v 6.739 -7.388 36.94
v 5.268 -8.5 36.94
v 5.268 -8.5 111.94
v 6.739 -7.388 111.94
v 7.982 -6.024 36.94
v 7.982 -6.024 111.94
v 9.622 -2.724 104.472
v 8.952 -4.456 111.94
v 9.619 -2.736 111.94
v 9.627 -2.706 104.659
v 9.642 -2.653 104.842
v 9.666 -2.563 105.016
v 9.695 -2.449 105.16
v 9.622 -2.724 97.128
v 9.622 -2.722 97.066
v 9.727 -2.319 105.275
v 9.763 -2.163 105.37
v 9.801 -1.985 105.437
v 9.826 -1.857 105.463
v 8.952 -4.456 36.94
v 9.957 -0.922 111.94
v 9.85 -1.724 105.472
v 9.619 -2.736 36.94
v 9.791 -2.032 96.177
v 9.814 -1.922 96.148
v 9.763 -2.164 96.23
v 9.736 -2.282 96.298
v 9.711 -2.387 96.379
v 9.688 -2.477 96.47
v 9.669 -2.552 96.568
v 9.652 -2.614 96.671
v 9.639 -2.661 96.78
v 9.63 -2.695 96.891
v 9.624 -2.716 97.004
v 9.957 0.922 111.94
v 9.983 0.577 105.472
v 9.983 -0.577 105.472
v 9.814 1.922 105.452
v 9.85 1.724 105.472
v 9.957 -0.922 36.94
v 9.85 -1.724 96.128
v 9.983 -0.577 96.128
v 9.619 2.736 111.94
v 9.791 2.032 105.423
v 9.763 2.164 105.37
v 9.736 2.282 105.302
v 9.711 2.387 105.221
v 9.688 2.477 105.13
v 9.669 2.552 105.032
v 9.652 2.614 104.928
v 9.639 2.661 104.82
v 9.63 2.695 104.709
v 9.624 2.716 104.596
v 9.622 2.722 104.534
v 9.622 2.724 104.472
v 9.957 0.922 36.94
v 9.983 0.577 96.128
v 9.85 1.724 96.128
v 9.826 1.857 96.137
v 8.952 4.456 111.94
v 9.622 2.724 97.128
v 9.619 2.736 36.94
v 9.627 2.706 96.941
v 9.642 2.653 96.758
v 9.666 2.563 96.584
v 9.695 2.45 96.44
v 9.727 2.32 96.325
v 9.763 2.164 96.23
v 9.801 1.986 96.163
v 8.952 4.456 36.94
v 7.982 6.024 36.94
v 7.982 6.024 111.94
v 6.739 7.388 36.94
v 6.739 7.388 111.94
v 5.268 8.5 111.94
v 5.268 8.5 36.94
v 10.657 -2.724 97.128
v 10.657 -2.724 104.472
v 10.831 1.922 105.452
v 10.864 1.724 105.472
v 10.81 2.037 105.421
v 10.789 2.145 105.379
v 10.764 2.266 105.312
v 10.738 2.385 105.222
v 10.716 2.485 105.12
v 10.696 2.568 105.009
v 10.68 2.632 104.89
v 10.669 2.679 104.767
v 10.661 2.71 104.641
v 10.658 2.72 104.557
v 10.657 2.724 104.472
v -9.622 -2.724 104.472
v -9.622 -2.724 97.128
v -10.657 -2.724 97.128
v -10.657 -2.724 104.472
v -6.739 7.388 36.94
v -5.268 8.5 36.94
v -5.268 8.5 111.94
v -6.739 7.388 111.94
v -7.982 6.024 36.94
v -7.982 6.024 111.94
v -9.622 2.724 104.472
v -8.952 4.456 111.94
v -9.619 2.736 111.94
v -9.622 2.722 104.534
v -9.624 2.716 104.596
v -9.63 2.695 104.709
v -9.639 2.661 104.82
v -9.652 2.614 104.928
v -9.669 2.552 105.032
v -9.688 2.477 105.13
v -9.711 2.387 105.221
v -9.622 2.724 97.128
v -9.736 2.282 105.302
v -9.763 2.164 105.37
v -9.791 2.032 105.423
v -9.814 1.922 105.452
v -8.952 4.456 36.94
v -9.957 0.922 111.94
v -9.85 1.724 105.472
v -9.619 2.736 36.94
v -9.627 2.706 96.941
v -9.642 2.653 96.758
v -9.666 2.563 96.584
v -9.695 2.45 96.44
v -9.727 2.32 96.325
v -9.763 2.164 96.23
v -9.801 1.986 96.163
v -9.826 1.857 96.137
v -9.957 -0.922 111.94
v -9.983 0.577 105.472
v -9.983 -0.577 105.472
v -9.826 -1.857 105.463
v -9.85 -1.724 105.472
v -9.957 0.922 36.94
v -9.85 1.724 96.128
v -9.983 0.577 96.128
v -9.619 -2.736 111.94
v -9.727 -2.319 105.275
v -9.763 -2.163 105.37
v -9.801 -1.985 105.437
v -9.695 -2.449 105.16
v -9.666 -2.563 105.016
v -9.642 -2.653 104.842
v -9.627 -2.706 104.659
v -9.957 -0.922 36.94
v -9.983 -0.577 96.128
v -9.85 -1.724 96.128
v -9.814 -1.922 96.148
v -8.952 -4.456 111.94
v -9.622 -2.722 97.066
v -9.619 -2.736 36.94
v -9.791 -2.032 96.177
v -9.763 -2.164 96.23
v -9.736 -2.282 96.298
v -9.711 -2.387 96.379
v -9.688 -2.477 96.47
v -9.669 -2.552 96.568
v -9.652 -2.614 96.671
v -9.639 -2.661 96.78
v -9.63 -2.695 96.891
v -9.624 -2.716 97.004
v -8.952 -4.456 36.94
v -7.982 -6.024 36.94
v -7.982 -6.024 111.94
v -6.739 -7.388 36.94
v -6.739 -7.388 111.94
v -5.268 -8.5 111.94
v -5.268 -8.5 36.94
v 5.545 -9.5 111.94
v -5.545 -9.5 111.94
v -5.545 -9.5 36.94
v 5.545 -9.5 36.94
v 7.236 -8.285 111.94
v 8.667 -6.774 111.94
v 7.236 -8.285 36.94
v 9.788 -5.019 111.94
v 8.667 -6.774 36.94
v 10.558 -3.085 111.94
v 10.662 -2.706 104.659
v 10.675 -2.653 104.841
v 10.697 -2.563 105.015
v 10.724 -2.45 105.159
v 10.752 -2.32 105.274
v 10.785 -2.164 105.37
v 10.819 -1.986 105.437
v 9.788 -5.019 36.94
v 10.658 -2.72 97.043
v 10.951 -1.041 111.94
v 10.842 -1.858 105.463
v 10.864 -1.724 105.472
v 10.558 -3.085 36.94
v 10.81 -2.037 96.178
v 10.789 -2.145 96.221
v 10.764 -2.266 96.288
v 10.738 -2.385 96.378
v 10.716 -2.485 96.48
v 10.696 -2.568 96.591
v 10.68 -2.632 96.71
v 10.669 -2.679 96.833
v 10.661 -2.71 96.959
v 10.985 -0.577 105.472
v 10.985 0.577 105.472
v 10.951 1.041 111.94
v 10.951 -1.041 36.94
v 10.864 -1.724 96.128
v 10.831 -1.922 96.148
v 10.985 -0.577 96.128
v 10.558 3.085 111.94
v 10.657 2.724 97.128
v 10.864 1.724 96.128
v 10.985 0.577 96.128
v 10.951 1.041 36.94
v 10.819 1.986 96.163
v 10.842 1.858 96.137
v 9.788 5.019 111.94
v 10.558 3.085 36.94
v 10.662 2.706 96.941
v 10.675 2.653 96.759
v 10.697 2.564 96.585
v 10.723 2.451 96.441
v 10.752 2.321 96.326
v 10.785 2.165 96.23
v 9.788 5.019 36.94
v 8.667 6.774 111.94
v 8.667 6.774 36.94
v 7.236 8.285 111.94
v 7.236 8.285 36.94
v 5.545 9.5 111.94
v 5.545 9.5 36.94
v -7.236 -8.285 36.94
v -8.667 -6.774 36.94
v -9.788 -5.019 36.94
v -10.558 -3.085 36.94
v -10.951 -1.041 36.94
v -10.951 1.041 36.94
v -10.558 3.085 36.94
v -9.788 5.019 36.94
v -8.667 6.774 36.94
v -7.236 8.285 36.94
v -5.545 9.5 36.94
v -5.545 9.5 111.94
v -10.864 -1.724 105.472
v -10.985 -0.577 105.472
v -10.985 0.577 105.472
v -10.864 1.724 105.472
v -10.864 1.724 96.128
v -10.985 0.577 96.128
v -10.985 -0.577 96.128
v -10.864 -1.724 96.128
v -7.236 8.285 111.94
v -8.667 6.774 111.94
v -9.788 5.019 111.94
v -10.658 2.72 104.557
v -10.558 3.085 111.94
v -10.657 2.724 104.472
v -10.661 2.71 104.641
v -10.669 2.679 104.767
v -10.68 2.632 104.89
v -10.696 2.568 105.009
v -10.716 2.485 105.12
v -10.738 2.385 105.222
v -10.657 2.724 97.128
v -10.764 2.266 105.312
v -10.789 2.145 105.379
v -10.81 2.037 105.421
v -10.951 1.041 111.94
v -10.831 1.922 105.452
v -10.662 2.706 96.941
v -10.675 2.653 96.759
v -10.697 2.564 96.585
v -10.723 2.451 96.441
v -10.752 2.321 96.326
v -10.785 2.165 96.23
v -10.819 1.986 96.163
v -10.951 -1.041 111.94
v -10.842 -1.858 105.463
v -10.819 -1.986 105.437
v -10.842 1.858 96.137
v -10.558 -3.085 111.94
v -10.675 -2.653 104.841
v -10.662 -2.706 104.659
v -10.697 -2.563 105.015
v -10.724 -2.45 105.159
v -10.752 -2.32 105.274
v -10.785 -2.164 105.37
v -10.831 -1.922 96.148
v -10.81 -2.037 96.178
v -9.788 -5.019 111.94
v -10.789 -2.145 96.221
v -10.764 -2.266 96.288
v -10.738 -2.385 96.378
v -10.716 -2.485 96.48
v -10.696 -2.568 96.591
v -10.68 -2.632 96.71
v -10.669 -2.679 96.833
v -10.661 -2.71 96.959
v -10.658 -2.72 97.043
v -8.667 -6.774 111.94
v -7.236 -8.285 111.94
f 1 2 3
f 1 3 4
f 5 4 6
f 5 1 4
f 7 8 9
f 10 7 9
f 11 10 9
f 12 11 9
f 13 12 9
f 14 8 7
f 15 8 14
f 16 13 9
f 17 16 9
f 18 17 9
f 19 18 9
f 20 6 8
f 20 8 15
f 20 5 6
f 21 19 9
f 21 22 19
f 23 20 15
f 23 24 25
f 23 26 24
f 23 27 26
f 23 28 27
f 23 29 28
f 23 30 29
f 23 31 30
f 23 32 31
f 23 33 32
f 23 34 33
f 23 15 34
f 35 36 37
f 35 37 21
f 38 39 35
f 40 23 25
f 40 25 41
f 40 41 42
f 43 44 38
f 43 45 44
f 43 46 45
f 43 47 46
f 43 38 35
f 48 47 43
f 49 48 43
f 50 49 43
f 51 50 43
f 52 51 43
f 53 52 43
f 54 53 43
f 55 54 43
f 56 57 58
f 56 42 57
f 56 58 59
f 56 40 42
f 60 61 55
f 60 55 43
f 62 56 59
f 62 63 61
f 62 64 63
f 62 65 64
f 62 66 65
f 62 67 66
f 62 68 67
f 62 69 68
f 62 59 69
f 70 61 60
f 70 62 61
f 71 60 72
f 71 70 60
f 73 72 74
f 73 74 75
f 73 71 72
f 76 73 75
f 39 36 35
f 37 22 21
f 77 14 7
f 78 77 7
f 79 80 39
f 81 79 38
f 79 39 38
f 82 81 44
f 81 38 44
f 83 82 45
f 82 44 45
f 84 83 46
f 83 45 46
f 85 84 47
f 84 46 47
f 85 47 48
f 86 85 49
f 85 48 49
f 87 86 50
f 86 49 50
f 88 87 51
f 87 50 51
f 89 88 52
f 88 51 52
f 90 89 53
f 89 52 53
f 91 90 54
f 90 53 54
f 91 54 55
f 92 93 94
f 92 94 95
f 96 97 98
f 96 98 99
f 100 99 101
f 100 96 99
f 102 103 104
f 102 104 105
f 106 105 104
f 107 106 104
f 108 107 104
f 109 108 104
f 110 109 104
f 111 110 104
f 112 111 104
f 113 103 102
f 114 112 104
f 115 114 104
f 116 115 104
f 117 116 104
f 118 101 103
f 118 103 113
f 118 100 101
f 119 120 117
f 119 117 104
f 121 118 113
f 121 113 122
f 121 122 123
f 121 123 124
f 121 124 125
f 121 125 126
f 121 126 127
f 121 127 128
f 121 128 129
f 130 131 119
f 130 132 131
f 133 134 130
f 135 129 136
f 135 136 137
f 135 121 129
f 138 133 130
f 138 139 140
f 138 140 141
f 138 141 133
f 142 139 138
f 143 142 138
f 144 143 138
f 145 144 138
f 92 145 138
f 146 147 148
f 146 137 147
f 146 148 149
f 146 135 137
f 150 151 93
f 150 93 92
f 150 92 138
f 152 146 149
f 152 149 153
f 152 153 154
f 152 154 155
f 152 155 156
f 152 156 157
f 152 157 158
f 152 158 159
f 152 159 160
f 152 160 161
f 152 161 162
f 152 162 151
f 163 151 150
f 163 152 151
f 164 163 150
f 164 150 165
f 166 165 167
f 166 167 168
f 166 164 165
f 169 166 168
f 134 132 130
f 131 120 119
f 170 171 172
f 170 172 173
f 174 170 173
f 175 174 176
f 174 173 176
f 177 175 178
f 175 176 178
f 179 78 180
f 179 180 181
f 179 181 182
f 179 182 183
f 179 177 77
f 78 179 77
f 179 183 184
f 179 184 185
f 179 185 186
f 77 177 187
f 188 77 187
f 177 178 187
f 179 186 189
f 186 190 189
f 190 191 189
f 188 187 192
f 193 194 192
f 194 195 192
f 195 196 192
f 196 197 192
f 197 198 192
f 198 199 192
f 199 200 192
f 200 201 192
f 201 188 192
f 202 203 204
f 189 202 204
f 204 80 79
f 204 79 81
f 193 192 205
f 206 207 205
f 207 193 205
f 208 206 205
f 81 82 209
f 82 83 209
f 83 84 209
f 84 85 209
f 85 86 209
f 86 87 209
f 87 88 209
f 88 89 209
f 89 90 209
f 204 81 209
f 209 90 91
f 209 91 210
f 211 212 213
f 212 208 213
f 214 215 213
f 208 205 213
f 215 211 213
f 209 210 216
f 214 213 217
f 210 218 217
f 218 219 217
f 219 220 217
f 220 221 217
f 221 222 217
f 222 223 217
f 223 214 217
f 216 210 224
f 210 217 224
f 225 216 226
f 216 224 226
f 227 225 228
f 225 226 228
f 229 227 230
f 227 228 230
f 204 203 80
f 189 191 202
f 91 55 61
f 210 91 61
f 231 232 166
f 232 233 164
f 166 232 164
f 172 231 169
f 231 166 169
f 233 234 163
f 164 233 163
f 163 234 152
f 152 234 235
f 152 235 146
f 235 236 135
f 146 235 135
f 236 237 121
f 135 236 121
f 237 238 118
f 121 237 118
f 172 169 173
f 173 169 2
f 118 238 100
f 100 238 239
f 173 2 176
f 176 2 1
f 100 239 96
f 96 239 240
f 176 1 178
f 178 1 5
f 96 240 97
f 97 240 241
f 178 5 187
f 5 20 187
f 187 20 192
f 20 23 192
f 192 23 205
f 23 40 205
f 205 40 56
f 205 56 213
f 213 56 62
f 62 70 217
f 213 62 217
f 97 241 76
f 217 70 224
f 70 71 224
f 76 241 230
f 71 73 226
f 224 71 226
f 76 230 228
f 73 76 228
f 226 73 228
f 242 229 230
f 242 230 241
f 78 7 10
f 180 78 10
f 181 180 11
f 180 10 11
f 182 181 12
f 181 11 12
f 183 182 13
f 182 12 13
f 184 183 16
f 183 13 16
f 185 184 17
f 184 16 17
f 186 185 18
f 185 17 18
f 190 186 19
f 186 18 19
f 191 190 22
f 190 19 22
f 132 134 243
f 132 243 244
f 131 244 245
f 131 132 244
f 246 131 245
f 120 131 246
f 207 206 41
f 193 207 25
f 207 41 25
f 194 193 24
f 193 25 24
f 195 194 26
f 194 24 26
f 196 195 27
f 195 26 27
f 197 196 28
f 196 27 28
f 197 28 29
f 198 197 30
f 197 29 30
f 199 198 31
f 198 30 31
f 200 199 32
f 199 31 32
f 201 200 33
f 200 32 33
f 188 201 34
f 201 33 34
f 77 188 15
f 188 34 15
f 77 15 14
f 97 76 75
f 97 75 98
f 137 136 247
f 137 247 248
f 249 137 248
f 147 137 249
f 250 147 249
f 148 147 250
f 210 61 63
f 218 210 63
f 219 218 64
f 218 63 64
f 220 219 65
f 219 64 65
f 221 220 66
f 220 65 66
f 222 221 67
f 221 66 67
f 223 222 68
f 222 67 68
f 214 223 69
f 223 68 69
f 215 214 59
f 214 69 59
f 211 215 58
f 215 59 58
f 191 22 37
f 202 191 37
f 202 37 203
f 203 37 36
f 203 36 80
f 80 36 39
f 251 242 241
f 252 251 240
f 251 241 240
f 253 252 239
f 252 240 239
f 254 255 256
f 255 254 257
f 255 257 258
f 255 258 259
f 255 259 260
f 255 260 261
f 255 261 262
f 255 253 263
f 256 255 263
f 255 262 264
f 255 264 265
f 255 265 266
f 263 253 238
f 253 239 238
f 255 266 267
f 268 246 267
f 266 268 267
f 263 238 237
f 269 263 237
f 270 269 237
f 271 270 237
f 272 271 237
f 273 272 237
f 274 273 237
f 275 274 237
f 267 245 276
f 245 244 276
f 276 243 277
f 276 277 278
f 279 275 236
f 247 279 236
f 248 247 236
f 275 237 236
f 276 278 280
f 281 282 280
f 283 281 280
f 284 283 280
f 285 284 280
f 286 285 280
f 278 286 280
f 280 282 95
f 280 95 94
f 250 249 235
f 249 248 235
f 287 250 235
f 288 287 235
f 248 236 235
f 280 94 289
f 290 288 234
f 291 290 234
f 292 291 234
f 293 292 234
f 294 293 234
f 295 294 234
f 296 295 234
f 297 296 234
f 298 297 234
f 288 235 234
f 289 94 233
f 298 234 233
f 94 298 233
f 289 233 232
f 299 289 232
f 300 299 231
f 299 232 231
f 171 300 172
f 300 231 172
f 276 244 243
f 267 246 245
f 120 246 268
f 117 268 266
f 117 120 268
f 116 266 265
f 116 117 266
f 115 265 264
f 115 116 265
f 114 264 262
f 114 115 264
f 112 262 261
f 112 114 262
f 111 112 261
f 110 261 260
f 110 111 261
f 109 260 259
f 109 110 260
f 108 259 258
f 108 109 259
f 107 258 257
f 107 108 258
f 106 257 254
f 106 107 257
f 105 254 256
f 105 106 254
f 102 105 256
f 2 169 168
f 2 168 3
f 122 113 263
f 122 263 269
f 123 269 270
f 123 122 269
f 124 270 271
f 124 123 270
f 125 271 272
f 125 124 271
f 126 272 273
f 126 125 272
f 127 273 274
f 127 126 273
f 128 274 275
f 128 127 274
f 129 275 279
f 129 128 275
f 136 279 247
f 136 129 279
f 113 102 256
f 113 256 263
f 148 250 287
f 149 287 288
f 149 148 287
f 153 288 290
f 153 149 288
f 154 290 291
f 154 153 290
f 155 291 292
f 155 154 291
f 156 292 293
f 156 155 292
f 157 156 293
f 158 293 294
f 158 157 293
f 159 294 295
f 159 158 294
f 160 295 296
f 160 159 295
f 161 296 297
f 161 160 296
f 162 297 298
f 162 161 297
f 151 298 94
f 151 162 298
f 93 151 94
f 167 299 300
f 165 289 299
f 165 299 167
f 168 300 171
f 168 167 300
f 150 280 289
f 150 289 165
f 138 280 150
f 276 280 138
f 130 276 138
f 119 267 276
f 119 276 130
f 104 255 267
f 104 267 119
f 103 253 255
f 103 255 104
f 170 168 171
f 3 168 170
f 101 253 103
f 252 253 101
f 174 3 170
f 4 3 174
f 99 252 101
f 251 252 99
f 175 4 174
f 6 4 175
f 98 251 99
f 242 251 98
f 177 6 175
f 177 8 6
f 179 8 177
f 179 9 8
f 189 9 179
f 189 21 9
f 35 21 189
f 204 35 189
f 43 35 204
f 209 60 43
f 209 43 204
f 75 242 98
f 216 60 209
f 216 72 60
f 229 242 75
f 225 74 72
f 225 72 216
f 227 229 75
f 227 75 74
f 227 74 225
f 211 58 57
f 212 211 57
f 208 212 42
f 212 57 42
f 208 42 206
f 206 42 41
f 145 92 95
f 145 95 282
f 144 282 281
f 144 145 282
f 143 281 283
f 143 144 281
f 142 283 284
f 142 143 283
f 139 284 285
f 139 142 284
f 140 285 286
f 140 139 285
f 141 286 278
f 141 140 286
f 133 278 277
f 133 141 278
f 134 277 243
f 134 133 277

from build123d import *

# Parameters (mm, degrees)
BOSS_EXTRUDE1_DEPTH     = 150
CUT_EXTRUDE1_DEPTH      = 23
CUT_EXTRUDE1_DEPTH_BACK = 23
SCALE1_SCALE            = 0.5


with BuildPart() as part:
    # Sketch1 → Boss-Extrude1 (new body)
    with BuildSketch(Plane.XY):
        with BuildLine():
            Line((11.090536506, 19), (-11.090536506, 19))
            ThreePointArc((-11.090536506, 19), (-22, 0), (-11.090536506, -19))
            Line((-11.090536506, -19), (11.090536506, -19))
            ThreePointArc((11.090536506, -19), (22, 0), (11.090536506, 19))
        make_face()
        with BuildLine():
            Line((10.535653753, 17), (-10.535653753, 17))
            ThreePointArc((-10.535653753, 17), (-20, 0), (-10.535653753, -17))
            Line((-10.535653753, -17), (10.535653753, -17))
            ThreePointArc((10.535653753, -17), (20, 0), (10.535653753, 17))
        make_face(mode=Mode.SUBTRACT)
    extrude(amount=BOSS_EXTRUDE1_DEPTH)

    # Sketch2 → Cut-Extrude1 (cut, two sides)
    with BuildSketch(Plane(origin=(0, 0, 0), x_dir=(0, 0, -1), z_dir=(1, 0, 0))) as cut_extrude1_sk:
        with BuildLine():
            Line((-135.063632734, 5.44778031), (-120.375877862, 5.44778031))
            ThreePointArc((-120.375877862, 5.44778031), (-118.961664299, 4.861993873), (-118.375877862, 3.44778031))
            Line((-118.375877862, 3.44778031), (-118.375877862, -3.44778031))
            ThreePointArc((-118.375877862, -3.44778031), (-118.961664299, -4.861993873), (-120.375877862, -5.44778031))
            Line((-120.375877862, -5.44778031), (-135.063632734, -5.44778031))
            ThreePointArc((-135.063632734, -5.44778031), (-136.477846296, -4.861993873), (-137.063632734, -3.44778031))
            Line((-137.063632734, -3.44778031), (-137.063632734, 3.44778031))
            ThreePointArc((-137.063632734, 3.44778031), (-136.477846296, 4.861993873), (-135.063632734, 5.44778031))
        make_face()
    extrude(amount=CUT_EXTRUDE1_DEPTH, mode=Mode.SUBTRACT)
    extrude(cut_extrude1_sk.sketch, amount=-CUT_EXTRUDE1_DEPTH_BACK, mode=Mode.SUBTRACT)


with BuildPart() as part_1:
    # Scale1: scaled about (-1.198e-06, 7.41e-07, 73.880063971)
    add(part.part.scale(SCALE1_SCALE).moved(Location((-5.99e-07, 3.7e-07, 36.940031985))))


solid = part_1.part
